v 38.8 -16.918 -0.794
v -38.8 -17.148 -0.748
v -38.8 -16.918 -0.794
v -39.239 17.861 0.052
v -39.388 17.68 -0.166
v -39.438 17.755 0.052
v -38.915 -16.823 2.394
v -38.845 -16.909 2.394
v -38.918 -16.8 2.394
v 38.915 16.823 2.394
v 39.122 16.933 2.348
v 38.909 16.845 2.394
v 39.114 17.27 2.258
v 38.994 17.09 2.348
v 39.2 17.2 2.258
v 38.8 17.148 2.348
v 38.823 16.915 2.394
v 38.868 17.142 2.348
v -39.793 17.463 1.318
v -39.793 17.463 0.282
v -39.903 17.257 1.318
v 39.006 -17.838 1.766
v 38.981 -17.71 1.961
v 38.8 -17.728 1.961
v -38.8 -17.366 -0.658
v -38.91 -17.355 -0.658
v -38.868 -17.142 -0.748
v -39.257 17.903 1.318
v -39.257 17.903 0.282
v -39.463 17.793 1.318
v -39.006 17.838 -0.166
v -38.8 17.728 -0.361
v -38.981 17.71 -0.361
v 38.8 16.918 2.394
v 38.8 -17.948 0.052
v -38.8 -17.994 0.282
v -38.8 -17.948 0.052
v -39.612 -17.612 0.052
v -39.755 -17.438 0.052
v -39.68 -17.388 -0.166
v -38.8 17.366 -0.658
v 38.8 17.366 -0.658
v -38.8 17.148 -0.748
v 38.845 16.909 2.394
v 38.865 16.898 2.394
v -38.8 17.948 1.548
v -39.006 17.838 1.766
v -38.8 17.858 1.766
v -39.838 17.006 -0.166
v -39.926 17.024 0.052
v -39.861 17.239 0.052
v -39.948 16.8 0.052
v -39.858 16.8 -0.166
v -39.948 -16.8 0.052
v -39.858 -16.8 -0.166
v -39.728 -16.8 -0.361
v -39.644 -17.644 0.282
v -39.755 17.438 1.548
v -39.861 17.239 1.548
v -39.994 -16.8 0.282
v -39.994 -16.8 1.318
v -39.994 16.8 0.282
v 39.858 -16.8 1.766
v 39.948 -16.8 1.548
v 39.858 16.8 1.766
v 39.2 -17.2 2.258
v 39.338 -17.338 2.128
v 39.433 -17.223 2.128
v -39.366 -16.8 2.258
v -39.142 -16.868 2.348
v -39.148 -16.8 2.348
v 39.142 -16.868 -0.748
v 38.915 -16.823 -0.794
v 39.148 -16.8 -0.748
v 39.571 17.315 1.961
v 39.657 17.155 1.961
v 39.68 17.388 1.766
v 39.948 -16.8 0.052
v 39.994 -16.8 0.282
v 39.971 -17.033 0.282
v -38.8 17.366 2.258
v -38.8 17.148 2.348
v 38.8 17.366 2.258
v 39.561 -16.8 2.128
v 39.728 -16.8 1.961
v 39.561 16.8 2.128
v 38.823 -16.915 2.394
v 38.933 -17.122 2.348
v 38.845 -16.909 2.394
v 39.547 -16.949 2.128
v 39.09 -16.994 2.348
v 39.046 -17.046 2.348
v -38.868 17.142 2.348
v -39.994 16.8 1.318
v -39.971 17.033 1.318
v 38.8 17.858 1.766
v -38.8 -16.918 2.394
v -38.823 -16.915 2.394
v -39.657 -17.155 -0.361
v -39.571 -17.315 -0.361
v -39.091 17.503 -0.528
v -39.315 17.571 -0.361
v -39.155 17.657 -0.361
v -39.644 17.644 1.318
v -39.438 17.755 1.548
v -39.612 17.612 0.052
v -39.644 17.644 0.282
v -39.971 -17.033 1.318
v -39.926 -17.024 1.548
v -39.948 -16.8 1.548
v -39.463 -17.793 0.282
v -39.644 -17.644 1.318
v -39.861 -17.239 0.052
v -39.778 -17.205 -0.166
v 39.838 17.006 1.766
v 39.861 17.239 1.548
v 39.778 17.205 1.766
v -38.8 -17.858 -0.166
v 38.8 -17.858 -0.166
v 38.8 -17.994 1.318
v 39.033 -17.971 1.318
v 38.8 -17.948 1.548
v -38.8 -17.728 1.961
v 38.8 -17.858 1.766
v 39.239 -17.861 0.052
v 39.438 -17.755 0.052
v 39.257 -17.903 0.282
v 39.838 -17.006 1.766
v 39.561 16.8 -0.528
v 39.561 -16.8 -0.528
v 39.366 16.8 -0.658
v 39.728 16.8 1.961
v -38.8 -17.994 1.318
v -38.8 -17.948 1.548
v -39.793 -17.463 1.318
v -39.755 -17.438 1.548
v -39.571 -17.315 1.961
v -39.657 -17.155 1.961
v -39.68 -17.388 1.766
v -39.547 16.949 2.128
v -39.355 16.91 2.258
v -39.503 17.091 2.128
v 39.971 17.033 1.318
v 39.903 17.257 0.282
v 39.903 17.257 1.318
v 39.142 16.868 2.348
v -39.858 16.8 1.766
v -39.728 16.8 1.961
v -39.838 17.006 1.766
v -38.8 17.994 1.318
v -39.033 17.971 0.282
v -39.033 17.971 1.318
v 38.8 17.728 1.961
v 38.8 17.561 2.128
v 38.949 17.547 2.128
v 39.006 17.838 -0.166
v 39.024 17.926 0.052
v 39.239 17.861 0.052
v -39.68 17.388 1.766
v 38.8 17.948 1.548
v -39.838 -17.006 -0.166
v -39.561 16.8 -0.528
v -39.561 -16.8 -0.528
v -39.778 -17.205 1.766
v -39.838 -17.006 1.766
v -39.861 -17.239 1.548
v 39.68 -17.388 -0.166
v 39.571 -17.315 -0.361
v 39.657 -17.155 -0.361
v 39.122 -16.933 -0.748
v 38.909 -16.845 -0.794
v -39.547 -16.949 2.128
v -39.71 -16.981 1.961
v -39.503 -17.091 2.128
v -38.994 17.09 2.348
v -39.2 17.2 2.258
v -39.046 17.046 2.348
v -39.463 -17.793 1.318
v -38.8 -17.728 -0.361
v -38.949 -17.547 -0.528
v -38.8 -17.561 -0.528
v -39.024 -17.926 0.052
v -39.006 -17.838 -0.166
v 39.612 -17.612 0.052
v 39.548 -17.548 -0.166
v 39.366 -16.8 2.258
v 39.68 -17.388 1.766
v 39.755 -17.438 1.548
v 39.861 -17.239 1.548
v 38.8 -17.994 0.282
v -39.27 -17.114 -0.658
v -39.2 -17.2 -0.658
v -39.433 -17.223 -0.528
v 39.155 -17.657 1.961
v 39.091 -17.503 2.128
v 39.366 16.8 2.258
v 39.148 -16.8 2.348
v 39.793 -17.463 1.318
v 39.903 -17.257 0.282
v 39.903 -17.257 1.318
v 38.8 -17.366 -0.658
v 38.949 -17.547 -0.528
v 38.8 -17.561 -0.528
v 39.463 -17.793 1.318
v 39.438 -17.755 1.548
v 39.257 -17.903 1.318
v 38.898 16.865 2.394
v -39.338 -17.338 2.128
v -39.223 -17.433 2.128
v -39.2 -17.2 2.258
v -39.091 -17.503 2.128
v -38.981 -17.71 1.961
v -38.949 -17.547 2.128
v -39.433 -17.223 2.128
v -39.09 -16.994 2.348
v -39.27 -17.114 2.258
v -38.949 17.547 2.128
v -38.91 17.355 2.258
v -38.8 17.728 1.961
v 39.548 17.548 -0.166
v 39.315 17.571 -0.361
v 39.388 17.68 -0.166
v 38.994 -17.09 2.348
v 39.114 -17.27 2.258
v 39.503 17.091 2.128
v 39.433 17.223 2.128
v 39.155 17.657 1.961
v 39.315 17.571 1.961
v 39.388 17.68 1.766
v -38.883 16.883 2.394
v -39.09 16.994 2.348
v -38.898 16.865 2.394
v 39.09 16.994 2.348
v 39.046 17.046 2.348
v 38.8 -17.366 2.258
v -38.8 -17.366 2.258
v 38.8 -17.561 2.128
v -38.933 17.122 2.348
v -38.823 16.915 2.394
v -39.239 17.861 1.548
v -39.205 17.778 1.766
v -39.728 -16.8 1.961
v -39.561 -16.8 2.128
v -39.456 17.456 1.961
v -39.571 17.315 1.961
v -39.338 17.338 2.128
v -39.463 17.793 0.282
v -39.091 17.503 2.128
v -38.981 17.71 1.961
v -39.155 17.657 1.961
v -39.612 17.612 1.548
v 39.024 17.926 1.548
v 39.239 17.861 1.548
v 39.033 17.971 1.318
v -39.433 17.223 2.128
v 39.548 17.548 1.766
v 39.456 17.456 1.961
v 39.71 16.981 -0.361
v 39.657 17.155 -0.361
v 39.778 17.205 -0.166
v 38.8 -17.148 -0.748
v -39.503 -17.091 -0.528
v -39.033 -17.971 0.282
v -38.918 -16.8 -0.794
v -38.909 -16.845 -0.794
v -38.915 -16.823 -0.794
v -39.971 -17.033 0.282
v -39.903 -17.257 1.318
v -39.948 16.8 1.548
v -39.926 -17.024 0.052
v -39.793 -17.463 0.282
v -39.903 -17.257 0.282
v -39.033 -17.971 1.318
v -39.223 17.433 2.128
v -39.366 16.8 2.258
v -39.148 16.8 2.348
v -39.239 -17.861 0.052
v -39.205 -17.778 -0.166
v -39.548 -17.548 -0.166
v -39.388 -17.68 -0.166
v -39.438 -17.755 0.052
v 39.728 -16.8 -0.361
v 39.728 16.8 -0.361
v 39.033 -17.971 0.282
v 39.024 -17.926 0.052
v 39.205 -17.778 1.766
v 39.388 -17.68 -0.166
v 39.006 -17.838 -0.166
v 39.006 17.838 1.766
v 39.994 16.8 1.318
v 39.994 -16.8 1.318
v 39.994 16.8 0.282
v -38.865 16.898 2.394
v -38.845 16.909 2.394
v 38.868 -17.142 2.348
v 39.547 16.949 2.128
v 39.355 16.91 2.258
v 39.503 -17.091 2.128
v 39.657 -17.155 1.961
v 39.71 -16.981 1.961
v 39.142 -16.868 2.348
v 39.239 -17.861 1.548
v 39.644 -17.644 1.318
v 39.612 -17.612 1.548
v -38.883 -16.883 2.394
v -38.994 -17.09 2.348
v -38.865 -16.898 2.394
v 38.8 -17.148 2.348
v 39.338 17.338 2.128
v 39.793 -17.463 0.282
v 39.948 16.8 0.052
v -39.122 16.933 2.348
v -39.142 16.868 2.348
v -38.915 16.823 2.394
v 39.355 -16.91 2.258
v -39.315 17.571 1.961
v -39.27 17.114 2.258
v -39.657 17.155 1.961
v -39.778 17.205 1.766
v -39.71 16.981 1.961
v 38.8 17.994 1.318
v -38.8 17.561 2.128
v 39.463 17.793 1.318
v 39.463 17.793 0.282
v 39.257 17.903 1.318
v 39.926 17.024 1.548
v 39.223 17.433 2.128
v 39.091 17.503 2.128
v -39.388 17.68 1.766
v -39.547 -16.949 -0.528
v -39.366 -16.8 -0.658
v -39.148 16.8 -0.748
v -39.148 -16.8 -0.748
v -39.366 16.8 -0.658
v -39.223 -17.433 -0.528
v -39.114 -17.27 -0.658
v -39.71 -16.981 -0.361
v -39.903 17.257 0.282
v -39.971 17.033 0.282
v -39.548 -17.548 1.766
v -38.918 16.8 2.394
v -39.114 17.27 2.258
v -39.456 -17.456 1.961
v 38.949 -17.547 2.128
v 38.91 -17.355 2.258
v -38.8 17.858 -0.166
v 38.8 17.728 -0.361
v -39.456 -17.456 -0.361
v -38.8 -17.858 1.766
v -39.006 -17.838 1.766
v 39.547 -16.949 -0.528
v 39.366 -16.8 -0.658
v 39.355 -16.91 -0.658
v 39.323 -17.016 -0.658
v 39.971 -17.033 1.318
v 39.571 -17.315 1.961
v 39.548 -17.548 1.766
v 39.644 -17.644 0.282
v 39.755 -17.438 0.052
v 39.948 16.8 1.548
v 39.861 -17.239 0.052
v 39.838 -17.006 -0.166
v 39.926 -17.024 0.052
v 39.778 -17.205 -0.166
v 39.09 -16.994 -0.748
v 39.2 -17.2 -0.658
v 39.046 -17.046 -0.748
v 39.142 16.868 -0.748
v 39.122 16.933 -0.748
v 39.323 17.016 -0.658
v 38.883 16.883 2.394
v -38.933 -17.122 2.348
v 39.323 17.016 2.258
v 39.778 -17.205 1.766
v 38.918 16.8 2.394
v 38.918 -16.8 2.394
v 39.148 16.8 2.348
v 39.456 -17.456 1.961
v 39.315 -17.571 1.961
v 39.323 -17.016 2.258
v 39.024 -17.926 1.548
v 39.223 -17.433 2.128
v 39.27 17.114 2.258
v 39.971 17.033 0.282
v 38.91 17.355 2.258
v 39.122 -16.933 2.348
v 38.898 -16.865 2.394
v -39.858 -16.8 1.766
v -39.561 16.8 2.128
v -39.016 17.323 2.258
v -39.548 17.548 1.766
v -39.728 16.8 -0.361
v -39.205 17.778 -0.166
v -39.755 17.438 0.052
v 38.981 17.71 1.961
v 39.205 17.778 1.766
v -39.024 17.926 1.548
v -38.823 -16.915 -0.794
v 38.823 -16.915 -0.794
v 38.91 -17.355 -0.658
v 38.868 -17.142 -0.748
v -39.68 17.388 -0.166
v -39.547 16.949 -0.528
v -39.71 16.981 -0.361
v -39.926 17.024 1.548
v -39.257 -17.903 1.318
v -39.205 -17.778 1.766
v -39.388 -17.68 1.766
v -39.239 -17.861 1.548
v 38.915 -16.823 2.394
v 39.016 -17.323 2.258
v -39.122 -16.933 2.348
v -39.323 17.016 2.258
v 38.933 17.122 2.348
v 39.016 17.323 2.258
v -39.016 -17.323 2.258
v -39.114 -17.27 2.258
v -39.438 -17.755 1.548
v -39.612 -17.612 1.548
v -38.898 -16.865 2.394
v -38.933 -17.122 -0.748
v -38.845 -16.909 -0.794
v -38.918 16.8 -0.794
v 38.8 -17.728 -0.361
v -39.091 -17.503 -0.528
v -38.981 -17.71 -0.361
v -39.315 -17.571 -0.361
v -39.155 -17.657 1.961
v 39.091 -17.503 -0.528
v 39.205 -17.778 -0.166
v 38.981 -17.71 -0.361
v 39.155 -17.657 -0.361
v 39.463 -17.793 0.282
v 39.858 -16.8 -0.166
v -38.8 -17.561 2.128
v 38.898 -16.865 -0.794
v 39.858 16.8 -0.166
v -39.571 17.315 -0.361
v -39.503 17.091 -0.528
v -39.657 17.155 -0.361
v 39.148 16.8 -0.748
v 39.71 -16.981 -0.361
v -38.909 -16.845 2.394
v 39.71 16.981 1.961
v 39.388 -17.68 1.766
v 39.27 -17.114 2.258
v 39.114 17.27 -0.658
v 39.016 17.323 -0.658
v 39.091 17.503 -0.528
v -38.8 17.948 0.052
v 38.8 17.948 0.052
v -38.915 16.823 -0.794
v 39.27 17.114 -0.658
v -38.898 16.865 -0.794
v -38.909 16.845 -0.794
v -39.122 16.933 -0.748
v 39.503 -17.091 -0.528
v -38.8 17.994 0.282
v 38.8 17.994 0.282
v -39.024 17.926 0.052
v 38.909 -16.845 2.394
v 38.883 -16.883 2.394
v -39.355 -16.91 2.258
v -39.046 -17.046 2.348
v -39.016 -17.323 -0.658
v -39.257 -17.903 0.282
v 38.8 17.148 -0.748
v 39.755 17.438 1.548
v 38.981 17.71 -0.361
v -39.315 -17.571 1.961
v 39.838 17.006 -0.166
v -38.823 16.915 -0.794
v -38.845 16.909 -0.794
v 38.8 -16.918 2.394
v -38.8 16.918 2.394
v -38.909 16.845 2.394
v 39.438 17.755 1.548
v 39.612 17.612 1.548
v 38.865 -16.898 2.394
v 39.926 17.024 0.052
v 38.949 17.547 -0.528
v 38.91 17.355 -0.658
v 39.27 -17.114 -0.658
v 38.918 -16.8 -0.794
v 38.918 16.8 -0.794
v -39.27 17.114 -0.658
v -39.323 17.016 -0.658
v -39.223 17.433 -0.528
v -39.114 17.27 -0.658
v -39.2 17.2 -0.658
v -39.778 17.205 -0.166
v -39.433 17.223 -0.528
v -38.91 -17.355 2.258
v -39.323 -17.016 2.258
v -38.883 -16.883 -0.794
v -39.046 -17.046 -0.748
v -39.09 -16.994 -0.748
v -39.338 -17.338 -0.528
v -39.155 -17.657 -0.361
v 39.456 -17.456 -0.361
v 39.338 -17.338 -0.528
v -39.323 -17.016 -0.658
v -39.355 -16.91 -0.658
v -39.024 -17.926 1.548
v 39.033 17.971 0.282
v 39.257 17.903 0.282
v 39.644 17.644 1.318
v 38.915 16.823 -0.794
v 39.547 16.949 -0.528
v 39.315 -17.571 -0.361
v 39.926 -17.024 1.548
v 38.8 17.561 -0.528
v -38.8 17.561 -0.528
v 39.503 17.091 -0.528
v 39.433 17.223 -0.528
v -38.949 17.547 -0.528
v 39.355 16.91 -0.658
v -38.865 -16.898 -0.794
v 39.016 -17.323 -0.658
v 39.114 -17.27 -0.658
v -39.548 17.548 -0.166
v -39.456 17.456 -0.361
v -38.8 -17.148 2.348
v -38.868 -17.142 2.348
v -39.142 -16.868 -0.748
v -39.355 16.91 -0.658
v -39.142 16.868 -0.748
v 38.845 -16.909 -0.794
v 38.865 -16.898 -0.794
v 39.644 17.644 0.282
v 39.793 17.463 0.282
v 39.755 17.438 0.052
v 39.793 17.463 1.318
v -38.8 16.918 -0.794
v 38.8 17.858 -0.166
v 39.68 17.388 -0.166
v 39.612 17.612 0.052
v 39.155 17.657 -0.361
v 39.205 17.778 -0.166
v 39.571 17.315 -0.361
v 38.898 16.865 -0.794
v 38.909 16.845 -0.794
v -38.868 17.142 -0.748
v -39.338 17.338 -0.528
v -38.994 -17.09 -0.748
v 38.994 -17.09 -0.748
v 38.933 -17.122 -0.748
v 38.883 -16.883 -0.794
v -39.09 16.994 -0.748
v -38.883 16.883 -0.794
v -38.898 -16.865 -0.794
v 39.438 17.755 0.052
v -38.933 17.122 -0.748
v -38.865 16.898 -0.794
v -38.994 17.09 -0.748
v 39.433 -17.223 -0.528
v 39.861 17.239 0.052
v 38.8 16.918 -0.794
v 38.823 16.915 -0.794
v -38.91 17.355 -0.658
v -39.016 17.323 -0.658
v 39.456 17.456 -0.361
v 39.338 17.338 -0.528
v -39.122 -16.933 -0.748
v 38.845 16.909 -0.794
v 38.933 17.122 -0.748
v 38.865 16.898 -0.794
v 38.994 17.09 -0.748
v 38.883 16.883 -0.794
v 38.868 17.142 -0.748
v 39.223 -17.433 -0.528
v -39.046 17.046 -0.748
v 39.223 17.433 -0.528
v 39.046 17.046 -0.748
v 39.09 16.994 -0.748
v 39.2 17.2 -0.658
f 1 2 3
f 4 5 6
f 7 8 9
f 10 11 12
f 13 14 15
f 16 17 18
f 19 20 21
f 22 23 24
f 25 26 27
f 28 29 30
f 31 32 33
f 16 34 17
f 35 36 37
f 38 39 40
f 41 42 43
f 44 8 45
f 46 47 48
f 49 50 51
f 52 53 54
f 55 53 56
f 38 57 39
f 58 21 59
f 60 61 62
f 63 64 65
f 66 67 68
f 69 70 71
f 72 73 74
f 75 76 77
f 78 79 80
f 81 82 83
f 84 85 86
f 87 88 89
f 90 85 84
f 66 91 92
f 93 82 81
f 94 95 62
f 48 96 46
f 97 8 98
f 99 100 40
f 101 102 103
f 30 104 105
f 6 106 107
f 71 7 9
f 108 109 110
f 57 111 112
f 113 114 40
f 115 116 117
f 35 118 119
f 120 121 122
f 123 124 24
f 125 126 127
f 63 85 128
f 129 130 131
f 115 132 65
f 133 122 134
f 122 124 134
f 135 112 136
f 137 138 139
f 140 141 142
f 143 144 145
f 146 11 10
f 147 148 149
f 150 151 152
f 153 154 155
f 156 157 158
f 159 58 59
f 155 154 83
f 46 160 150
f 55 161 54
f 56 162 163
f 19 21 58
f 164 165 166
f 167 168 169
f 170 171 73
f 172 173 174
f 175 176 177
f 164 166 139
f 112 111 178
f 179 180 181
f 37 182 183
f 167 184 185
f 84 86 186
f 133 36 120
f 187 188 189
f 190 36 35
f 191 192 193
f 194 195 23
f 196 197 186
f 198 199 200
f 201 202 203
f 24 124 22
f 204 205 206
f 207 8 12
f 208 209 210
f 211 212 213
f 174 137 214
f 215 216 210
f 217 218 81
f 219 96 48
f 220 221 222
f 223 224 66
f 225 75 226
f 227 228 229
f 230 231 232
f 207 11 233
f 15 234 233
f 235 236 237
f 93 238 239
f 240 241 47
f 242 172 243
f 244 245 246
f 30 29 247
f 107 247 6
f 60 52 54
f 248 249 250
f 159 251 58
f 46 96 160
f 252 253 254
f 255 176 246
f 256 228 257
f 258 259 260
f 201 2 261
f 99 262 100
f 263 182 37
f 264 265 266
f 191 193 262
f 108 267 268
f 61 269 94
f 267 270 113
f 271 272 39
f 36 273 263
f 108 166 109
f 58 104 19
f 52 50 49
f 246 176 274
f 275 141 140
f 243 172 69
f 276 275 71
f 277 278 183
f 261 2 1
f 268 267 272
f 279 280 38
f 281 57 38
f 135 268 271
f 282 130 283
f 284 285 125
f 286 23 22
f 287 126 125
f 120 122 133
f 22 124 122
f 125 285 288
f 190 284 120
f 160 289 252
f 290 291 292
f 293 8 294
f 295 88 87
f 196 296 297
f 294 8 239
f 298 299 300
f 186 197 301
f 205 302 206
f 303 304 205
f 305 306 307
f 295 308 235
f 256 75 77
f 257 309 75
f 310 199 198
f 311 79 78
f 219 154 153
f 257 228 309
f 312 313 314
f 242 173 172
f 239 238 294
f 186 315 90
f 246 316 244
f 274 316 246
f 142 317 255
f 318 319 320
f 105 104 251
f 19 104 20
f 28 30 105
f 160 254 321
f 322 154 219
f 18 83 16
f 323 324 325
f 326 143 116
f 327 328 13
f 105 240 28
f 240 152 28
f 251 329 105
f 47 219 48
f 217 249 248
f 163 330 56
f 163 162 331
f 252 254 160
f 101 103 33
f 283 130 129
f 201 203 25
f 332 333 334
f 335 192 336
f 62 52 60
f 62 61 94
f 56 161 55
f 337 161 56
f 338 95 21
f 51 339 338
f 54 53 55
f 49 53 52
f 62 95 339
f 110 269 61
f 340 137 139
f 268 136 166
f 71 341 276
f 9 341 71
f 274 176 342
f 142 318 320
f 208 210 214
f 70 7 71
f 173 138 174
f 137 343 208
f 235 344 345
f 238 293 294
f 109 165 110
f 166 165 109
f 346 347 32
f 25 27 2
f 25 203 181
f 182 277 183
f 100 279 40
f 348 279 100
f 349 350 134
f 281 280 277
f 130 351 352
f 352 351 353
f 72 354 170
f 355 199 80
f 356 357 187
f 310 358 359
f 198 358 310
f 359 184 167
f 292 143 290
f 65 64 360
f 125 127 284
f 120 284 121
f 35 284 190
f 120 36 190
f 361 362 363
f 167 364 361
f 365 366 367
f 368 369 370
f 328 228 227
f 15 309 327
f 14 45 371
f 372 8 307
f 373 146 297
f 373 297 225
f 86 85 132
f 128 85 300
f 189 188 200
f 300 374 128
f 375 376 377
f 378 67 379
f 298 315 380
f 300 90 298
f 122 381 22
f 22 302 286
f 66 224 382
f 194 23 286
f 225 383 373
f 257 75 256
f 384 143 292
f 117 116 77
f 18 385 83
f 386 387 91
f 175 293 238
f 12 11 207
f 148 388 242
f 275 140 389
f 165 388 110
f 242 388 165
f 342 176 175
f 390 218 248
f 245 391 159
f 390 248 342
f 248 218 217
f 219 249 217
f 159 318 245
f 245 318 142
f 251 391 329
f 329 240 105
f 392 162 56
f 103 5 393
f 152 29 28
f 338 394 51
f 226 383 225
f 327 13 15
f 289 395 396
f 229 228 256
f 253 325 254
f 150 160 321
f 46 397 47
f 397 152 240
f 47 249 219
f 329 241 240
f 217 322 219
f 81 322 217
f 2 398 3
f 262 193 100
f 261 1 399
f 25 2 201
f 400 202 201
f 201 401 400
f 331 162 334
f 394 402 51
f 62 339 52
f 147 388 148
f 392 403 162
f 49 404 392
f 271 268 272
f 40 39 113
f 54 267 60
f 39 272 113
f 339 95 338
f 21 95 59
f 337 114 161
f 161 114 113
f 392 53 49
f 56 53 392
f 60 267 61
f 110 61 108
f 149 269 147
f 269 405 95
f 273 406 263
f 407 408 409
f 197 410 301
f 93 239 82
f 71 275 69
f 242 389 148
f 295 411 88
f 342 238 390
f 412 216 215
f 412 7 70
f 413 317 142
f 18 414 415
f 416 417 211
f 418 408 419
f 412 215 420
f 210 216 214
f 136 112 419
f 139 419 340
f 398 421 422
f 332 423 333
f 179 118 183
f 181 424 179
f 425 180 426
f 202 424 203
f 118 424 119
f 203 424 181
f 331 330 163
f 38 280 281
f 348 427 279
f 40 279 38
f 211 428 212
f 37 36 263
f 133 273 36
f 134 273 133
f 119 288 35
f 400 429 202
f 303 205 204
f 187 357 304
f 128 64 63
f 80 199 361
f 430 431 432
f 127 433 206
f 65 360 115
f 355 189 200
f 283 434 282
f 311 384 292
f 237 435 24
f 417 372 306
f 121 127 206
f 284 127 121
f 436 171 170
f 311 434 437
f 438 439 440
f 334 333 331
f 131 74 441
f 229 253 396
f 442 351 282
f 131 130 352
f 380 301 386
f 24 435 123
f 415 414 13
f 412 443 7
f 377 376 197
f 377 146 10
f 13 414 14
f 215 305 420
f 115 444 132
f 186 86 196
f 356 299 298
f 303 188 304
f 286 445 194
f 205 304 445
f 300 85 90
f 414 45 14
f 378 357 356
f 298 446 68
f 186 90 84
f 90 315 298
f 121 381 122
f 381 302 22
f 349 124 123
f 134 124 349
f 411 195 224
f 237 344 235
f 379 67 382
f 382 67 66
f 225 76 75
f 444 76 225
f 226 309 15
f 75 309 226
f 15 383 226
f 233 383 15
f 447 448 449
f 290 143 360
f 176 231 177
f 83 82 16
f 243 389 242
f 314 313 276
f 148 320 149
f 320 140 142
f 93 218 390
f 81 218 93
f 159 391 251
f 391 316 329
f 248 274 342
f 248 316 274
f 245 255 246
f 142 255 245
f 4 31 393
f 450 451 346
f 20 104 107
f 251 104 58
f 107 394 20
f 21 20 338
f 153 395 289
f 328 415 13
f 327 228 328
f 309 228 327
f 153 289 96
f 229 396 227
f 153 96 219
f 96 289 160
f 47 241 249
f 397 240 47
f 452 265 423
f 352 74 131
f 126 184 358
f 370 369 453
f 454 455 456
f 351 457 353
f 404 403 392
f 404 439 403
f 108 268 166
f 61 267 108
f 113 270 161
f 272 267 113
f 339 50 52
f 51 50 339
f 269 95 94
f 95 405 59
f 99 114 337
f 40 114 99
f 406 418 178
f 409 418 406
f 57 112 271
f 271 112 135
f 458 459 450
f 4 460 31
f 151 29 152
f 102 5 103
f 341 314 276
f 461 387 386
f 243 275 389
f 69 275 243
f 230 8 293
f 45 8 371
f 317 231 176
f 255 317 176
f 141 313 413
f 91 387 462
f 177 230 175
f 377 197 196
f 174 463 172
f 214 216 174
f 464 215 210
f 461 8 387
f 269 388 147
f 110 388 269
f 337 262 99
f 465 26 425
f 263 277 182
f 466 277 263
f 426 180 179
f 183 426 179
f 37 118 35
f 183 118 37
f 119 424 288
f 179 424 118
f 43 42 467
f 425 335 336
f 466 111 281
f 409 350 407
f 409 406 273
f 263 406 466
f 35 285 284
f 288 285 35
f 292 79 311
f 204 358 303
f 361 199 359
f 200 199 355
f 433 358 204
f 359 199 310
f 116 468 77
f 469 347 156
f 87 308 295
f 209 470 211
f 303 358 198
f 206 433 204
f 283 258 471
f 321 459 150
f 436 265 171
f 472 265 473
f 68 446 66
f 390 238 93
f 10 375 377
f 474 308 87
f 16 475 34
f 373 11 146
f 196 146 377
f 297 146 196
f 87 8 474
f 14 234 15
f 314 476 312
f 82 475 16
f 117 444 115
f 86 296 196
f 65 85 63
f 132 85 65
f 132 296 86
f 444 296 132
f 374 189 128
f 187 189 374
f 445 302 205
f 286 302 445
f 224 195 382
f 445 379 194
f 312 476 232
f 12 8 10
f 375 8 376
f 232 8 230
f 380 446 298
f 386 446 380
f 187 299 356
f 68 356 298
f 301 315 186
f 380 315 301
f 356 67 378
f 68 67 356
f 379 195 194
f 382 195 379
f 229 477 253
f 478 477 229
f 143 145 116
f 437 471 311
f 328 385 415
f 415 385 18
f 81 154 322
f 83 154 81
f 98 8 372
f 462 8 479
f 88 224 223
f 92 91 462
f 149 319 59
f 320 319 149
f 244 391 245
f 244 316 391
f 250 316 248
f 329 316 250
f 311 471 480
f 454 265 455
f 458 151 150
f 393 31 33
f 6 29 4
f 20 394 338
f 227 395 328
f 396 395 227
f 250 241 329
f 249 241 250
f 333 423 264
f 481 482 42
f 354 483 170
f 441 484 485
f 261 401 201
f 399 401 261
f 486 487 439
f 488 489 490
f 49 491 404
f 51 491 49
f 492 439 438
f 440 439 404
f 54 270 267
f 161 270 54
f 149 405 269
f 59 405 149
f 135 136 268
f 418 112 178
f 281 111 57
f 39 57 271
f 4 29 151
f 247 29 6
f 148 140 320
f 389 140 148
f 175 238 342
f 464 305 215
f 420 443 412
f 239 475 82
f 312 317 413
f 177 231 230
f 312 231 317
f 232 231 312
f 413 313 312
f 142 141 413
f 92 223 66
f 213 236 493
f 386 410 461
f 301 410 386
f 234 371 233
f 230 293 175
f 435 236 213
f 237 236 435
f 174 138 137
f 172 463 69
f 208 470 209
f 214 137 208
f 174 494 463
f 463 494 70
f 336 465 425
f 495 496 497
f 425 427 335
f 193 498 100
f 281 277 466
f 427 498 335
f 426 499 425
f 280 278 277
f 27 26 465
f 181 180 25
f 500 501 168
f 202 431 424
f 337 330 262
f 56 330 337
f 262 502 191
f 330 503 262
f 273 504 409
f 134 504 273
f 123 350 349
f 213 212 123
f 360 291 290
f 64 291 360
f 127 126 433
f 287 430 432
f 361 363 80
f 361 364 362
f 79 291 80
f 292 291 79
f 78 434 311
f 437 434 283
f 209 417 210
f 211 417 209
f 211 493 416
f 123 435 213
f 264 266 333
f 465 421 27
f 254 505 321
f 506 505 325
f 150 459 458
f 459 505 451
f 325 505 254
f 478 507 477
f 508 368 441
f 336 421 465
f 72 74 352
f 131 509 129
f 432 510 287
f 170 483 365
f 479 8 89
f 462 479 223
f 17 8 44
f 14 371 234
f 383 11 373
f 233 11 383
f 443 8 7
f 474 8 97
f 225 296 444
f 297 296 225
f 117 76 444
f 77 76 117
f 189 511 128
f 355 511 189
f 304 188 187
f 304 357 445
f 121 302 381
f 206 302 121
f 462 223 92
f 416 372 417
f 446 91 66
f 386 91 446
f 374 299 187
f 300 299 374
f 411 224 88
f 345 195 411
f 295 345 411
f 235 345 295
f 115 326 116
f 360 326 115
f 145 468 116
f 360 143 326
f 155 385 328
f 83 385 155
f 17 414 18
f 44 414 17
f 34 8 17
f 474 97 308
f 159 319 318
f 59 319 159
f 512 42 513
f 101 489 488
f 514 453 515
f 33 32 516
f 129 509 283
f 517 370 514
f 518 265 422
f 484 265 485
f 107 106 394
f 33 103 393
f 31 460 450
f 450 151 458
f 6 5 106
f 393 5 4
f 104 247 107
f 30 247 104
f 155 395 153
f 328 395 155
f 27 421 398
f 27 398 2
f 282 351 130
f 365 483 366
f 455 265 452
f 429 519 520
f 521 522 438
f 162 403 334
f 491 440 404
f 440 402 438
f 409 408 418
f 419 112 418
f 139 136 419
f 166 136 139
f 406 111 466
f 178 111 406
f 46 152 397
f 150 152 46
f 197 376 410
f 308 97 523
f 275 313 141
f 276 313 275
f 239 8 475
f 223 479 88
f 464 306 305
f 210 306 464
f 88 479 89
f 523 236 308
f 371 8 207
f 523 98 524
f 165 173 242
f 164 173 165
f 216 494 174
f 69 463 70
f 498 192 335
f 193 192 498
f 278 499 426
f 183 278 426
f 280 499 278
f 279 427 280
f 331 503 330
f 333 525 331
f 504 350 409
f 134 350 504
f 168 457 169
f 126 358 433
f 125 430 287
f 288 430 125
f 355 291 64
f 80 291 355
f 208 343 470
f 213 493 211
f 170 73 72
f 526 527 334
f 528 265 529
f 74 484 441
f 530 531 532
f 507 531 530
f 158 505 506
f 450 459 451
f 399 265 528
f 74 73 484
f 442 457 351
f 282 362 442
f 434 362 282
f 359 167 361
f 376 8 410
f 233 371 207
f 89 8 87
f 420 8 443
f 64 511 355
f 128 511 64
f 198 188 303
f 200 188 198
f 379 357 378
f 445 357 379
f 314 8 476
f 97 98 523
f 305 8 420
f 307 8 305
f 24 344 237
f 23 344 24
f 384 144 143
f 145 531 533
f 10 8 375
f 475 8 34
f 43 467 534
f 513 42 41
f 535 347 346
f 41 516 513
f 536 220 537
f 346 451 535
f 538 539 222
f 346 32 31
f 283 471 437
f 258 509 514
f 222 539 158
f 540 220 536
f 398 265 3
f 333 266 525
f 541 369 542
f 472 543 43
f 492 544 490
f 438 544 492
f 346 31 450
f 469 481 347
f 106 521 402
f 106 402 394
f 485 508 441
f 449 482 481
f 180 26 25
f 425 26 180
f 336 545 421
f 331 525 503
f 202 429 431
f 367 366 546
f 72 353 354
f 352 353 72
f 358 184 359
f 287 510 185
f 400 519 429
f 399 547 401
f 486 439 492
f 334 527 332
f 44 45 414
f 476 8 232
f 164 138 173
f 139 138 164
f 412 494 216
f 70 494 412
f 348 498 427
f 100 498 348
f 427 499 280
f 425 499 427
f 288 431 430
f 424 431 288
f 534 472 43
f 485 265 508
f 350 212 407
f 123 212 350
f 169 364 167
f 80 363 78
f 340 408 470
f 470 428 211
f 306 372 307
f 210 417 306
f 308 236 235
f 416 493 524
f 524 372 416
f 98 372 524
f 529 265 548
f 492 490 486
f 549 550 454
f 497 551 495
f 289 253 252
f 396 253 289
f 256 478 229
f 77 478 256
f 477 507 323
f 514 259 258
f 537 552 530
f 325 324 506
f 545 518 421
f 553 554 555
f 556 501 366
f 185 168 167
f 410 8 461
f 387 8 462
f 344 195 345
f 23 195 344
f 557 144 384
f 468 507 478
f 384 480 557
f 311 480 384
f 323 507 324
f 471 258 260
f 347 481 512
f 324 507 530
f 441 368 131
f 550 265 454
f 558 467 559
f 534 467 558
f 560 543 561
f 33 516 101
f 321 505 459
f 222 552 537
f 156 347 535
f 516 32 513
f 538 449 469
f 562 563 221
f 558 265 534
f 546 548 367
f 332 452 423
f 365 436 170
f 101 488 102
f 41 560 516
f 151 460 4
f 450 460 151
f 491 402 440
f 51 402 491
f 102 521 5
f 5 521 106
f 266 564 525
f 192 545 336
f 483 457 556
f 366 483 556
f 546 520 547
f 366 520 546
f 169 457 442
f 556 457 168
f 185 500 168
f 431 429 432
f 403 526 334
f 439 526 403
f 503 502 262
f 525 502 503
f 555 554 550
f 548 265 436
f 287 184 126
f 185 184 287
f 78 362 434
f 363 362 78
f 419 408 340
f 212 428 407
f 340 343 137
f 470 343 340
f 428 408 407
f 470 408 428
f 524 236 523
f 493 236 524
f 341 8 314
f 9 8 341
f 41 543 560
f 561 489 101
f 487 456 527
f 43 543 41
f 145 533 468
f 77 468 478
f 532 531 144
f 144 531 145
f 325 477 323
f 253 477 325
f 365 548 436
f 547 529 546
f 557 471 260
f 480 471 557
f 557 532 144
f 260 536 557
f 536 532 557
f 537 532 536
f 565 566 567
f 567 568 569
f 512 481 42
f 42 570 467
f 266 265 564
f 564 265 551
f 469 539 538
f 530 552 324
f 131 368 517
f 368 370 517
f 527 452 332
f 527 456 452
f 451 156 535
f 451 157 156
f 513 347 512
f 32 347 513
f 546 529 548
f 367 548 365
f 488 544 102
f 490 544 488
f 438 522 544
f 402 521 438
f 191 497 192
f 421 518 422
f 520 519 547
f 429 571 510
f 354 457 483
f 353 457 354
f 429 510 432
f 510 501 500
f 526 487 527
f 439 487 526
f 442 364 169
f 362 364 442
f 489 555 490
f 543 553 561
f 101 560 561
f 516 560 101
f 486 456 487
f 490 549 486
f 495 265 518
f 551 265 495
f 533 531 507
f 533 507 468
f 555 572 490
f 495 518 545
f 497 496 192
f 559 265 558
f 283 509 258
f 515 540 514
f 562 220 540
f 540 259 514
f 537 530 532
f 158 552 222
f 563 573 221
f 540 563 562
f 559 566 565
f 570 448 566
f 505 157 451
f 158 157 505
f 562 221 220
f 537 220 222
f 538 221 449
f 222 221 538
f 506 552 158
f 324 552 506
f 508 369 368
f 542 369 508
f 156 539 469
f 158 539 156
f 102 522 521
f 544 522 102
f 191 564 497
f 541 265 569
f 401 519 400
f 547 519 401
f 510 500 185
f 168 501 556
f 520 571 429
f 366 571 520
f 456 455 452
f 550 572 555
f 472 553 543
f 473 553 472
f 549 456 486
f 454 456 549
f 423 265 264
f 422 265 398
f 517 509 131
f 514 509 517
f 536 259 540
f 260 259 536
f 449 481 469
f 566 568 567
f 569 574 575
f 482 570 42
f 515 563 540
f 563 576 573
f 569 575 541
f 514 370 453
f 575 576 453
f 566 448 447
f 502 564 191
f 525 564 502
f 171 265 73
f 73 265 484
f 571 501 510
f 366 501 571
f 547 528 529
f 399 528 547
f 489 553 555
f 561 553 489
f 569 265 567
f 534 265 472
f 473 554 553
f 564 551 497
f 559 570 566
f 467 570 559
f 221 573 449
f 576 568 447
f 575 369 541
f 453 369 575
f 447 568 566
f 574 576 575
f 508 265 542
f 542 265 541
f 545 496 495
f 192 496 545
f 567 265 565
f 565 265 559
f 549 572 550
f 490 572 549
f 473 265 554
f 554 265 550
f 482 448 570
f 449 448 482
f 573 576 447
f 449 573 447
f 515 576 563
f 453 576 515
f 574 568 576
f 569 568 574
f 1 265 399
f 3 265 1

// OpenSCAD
// LCD1602 (I2C) (LCD1602 液晶顯示器) visual source for NexCAD.
// Units: millimeters. Origin: part bottom-center, matching src/parts/library.ts.
// This generated baseline is intentionally simple; refine it with measured details before exporting STL.

$fn = 32;

module rounded_box(size, r = 0.8) {
  hull() {
    for (x = [-size[0] / 2 + r, size[0] / 2 - r])
      for (y = [-size[1] / 2 + r, size[1] / 2 - r]) {
        translate([x, y, r]) sphere(r = r);
        translate([x, y, size[2] - r]) sphere(r = r);
      }
  }
}

color("#2e7d5b") rounded_box([80, 36, 1.6], min(1.2, min(80, 36) / 8));
